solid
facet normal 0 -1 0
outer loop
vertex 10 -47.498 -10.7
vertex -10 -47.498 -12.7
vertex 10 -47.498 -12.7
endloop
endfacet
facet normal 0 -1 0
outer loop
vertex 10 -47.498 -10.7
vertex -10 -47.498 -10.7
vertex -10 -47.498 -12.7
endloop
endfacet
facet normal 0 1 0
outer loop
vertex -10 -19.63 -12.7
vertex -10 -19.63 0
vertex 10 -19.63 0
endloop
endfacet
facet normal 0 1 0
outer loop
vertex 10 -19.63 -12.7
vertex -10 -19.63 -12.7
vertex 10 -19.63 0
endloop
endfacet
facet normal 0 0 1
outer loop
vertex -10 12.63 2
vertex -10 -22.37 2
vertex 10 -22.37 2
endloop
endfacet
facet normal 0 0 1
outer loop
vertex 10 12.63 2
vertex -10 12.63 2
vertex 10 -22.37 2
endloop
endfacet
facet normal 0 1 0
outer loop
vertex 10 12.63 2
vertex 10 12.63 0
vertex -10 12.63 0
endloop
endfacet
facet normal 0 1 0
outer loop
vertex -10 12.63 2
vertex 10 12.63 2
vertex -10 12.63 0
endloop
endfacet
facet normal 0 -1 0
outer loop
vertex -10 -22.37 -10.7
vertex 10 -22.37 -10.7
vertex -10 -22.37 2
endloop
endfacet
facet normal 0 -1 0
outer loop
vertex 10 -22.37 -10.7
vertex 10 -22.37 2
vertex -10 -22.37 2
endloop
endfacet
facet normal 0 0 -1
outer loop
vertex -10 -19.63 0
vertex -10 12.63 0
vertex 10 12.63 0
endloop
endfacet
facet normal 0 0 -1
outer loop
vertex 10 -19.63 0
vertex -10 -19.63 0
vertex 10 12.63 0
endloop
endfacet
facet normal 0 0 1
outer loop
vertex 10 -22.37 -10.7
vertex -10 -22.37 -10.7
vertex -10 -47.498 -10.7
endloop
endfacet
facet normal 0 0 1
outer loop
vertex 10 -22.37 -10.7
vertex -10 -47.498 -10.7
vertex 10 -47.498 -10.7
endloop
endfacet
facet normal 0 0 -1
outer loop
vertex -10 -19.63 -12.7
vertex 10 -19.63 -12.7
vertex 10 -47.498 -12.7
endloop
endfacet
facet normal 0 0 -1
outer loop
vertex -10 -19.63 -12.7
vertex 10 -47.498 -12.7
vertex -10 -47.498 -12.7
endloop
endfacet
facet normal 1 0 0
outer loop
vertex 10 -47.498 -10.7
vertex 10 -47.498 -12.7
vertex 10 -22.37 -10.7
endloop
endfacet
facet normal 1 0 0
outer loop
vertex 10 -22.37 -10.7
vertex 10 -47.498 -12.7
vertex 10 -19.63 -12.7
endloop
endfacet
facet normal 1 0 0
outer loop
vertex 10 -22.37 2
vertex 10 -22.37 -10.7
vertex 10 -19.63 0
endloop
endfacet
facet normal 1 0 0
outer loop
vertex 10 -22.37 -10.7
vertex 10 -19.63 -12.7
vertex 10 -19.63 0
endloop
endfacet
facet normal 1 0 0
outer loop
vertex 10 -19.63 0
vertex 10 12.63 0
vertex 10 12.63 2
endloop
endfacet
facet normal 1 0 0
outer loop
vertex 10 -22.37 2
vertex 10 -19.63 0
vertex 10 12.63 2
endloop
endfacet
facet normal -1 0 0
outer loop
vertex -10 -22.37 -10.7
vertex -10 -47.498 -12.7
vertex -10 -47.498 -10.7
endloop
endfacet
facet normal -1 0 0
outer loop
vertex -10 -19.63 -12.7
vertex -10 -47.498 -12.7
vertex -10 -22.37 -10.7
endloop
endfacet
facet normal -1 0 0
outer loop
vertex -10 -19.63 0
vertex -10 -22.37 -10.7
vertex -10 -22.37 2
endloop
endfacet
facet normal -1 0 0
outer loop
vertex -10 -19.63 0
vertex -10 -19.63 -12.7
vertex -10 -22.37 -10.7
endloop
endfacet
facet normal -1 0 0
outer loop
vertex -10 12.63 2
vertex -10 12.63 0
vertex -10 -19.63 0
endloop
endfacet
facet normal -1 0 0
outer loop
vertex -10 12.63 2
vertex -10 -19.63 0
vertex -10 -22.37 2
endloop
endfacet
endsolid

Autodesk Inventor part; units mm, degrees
ref_plane "YZ Plane" through (0, 0, 0) normal (1, 0, 0) x (0, 1, 0)
sketch "Sketch1" plane through (0, 0, 0) normal (0, 0, 1) x (1, 0, 0)
  line L0 (4.2148, -12.63) -> (4.2148, -18.63) projected
  line L1 (0.6968, -12.63) -> (4.2148, -12.63) projected
  line L2 (0.6968, 12.63) -> (0.6968, -12.63) projected
  line L3 (16.6988, 12.63) -> (0.6968, 12.63) projected
  line L4 (16.6988, 17.202) -> (16.6988, 12.63) projected
  line L5 (21.6388, 17.202) -> (16.6988, 17.202) projected
  line L6 (21.6388, 12.63) -> (21.6388, 17.202) projected
  line L7 (23.7568, 12.63) -> (21.6388, 12.63) projected
  line L8 (23.7568, 18.63) -> (23.7568, 12.63) projected
  line L9 (-23.7568, 18.63) -> (23.7568, 18.63) projected
  line L10 (-23.7568, 12.63) -> (-23.7568, 18.63) projected
  line L11 (-21.6388, 12.63) -> (-23.7568, 12.63) projected
  line L12 (-21.6388, 17.202) -> (-21.6388, 12.63) projected
  line L13 (-16.6988, 17.202) -> (-21.6388, 17.202) projected
  line L14 (-16.6988, 12.63) -> (-16.6988, 17.202) projected
  line L15 (-0.6968, 12.63) -> (-16.6988, 12.63) projected
  line L16 (-0.6968, -12.63) -> (-0.6968, 12.63) projected
  line L17 (-4.2148, -12.63) -> (-0.6968, -12.63) projected
  line L18 (-4.2148, -18.63) -> (-4.2148, -12.63) projected
  line L19 (4.2148, -18.63) -> (-4.2148, -18.63) projected
  line L20 (0, 12.63) -> (10, 12.63)
  line L21 (10, 12.63) -> (-10, 12.63)
  line L22 (10, 12.63) -> (10, -22.37)
  line L23 (10, -22.37) -> (-10, -22.37)
  line L24 (-10, -22.37) -> (-10, 12.63)
  line L25 (-10, 12.63) -> (10, 12.63)
  line L26 (10, 12.63) -> (10, -22.37)
  point P0 (0, 0)
  dimension "d0" = 10
  dimension "d1" = 20
  dimension "d2" = 35
extrude "Extrusion1" add sketch "Sketch1" along normal blind 2 contours L1 L2 L3 L22 L23 L24 L15 L16 L17 L18 L19 L0 | L0 L19 L18 L17 L16 L21 L20 L2 L1
sketch "Sketch2" plane through (0, 0, 0) normal (0, 0, -1) x (-1, 0, 0)
  line L0 (9.2308, -18.63) -> (23.7568, -18.63) projected
  line L1 (4.2148, -19.63) -> (-4.2148, -19.63) projected
  line L2 (10, 12.63) -> (10, -22.37) projected
  line L3 (-10, -22.37) -> (-10, 12.63) projected
  line L4 (10, -19.63) -> (-10, -19.63)
  line L5 (-10, -19.63) -> (-10, -22.37)
  line L6 (-10, -22.37) -> (10, -22.37)
  line L7 (10, -22.37) -> (10, -19.63)
  point P0 (0, 0)
ref_plane "Work Plane1" through (-27.5, -47.498, -12.7) normal (0, 0, 1) x (1, 0, 0)
extrude "Extrusion2" add sketch "Sketch2" along normal up to surface (12.7 mm away)
sketch "Sketch3" plane through (-10, -22.37, 2) normal (0, -1, 0) x (1, 0, 0)
  line L0 (0, -14.7) -> (0, 0) projected
  line L1 (0, -14.7) -> (0, -12.7)
  line L2 (20, -14.7) -> (20, 0) projected
  line L3 (0, -12.7) -> (20, -12.7)
  line L4 (20, -12.7) -> (20, -14.7)
  line L5 (20, -14.7) -> (0, -14.7)
  line L6 (0, -14.7) -> (0, -12.7)
  point P0 (10, -2)
  dimension "d7" = 2
ref_plane "Work Plane2" through (-27.5, -47.498, -20.1034) normal (0, -1, 0) x (1, 0, 0)
extrude "Extrusion3" add sketch "Sketch3" along normal up to surface (25.128 mm away)
properties part number "SyringeConnector"
